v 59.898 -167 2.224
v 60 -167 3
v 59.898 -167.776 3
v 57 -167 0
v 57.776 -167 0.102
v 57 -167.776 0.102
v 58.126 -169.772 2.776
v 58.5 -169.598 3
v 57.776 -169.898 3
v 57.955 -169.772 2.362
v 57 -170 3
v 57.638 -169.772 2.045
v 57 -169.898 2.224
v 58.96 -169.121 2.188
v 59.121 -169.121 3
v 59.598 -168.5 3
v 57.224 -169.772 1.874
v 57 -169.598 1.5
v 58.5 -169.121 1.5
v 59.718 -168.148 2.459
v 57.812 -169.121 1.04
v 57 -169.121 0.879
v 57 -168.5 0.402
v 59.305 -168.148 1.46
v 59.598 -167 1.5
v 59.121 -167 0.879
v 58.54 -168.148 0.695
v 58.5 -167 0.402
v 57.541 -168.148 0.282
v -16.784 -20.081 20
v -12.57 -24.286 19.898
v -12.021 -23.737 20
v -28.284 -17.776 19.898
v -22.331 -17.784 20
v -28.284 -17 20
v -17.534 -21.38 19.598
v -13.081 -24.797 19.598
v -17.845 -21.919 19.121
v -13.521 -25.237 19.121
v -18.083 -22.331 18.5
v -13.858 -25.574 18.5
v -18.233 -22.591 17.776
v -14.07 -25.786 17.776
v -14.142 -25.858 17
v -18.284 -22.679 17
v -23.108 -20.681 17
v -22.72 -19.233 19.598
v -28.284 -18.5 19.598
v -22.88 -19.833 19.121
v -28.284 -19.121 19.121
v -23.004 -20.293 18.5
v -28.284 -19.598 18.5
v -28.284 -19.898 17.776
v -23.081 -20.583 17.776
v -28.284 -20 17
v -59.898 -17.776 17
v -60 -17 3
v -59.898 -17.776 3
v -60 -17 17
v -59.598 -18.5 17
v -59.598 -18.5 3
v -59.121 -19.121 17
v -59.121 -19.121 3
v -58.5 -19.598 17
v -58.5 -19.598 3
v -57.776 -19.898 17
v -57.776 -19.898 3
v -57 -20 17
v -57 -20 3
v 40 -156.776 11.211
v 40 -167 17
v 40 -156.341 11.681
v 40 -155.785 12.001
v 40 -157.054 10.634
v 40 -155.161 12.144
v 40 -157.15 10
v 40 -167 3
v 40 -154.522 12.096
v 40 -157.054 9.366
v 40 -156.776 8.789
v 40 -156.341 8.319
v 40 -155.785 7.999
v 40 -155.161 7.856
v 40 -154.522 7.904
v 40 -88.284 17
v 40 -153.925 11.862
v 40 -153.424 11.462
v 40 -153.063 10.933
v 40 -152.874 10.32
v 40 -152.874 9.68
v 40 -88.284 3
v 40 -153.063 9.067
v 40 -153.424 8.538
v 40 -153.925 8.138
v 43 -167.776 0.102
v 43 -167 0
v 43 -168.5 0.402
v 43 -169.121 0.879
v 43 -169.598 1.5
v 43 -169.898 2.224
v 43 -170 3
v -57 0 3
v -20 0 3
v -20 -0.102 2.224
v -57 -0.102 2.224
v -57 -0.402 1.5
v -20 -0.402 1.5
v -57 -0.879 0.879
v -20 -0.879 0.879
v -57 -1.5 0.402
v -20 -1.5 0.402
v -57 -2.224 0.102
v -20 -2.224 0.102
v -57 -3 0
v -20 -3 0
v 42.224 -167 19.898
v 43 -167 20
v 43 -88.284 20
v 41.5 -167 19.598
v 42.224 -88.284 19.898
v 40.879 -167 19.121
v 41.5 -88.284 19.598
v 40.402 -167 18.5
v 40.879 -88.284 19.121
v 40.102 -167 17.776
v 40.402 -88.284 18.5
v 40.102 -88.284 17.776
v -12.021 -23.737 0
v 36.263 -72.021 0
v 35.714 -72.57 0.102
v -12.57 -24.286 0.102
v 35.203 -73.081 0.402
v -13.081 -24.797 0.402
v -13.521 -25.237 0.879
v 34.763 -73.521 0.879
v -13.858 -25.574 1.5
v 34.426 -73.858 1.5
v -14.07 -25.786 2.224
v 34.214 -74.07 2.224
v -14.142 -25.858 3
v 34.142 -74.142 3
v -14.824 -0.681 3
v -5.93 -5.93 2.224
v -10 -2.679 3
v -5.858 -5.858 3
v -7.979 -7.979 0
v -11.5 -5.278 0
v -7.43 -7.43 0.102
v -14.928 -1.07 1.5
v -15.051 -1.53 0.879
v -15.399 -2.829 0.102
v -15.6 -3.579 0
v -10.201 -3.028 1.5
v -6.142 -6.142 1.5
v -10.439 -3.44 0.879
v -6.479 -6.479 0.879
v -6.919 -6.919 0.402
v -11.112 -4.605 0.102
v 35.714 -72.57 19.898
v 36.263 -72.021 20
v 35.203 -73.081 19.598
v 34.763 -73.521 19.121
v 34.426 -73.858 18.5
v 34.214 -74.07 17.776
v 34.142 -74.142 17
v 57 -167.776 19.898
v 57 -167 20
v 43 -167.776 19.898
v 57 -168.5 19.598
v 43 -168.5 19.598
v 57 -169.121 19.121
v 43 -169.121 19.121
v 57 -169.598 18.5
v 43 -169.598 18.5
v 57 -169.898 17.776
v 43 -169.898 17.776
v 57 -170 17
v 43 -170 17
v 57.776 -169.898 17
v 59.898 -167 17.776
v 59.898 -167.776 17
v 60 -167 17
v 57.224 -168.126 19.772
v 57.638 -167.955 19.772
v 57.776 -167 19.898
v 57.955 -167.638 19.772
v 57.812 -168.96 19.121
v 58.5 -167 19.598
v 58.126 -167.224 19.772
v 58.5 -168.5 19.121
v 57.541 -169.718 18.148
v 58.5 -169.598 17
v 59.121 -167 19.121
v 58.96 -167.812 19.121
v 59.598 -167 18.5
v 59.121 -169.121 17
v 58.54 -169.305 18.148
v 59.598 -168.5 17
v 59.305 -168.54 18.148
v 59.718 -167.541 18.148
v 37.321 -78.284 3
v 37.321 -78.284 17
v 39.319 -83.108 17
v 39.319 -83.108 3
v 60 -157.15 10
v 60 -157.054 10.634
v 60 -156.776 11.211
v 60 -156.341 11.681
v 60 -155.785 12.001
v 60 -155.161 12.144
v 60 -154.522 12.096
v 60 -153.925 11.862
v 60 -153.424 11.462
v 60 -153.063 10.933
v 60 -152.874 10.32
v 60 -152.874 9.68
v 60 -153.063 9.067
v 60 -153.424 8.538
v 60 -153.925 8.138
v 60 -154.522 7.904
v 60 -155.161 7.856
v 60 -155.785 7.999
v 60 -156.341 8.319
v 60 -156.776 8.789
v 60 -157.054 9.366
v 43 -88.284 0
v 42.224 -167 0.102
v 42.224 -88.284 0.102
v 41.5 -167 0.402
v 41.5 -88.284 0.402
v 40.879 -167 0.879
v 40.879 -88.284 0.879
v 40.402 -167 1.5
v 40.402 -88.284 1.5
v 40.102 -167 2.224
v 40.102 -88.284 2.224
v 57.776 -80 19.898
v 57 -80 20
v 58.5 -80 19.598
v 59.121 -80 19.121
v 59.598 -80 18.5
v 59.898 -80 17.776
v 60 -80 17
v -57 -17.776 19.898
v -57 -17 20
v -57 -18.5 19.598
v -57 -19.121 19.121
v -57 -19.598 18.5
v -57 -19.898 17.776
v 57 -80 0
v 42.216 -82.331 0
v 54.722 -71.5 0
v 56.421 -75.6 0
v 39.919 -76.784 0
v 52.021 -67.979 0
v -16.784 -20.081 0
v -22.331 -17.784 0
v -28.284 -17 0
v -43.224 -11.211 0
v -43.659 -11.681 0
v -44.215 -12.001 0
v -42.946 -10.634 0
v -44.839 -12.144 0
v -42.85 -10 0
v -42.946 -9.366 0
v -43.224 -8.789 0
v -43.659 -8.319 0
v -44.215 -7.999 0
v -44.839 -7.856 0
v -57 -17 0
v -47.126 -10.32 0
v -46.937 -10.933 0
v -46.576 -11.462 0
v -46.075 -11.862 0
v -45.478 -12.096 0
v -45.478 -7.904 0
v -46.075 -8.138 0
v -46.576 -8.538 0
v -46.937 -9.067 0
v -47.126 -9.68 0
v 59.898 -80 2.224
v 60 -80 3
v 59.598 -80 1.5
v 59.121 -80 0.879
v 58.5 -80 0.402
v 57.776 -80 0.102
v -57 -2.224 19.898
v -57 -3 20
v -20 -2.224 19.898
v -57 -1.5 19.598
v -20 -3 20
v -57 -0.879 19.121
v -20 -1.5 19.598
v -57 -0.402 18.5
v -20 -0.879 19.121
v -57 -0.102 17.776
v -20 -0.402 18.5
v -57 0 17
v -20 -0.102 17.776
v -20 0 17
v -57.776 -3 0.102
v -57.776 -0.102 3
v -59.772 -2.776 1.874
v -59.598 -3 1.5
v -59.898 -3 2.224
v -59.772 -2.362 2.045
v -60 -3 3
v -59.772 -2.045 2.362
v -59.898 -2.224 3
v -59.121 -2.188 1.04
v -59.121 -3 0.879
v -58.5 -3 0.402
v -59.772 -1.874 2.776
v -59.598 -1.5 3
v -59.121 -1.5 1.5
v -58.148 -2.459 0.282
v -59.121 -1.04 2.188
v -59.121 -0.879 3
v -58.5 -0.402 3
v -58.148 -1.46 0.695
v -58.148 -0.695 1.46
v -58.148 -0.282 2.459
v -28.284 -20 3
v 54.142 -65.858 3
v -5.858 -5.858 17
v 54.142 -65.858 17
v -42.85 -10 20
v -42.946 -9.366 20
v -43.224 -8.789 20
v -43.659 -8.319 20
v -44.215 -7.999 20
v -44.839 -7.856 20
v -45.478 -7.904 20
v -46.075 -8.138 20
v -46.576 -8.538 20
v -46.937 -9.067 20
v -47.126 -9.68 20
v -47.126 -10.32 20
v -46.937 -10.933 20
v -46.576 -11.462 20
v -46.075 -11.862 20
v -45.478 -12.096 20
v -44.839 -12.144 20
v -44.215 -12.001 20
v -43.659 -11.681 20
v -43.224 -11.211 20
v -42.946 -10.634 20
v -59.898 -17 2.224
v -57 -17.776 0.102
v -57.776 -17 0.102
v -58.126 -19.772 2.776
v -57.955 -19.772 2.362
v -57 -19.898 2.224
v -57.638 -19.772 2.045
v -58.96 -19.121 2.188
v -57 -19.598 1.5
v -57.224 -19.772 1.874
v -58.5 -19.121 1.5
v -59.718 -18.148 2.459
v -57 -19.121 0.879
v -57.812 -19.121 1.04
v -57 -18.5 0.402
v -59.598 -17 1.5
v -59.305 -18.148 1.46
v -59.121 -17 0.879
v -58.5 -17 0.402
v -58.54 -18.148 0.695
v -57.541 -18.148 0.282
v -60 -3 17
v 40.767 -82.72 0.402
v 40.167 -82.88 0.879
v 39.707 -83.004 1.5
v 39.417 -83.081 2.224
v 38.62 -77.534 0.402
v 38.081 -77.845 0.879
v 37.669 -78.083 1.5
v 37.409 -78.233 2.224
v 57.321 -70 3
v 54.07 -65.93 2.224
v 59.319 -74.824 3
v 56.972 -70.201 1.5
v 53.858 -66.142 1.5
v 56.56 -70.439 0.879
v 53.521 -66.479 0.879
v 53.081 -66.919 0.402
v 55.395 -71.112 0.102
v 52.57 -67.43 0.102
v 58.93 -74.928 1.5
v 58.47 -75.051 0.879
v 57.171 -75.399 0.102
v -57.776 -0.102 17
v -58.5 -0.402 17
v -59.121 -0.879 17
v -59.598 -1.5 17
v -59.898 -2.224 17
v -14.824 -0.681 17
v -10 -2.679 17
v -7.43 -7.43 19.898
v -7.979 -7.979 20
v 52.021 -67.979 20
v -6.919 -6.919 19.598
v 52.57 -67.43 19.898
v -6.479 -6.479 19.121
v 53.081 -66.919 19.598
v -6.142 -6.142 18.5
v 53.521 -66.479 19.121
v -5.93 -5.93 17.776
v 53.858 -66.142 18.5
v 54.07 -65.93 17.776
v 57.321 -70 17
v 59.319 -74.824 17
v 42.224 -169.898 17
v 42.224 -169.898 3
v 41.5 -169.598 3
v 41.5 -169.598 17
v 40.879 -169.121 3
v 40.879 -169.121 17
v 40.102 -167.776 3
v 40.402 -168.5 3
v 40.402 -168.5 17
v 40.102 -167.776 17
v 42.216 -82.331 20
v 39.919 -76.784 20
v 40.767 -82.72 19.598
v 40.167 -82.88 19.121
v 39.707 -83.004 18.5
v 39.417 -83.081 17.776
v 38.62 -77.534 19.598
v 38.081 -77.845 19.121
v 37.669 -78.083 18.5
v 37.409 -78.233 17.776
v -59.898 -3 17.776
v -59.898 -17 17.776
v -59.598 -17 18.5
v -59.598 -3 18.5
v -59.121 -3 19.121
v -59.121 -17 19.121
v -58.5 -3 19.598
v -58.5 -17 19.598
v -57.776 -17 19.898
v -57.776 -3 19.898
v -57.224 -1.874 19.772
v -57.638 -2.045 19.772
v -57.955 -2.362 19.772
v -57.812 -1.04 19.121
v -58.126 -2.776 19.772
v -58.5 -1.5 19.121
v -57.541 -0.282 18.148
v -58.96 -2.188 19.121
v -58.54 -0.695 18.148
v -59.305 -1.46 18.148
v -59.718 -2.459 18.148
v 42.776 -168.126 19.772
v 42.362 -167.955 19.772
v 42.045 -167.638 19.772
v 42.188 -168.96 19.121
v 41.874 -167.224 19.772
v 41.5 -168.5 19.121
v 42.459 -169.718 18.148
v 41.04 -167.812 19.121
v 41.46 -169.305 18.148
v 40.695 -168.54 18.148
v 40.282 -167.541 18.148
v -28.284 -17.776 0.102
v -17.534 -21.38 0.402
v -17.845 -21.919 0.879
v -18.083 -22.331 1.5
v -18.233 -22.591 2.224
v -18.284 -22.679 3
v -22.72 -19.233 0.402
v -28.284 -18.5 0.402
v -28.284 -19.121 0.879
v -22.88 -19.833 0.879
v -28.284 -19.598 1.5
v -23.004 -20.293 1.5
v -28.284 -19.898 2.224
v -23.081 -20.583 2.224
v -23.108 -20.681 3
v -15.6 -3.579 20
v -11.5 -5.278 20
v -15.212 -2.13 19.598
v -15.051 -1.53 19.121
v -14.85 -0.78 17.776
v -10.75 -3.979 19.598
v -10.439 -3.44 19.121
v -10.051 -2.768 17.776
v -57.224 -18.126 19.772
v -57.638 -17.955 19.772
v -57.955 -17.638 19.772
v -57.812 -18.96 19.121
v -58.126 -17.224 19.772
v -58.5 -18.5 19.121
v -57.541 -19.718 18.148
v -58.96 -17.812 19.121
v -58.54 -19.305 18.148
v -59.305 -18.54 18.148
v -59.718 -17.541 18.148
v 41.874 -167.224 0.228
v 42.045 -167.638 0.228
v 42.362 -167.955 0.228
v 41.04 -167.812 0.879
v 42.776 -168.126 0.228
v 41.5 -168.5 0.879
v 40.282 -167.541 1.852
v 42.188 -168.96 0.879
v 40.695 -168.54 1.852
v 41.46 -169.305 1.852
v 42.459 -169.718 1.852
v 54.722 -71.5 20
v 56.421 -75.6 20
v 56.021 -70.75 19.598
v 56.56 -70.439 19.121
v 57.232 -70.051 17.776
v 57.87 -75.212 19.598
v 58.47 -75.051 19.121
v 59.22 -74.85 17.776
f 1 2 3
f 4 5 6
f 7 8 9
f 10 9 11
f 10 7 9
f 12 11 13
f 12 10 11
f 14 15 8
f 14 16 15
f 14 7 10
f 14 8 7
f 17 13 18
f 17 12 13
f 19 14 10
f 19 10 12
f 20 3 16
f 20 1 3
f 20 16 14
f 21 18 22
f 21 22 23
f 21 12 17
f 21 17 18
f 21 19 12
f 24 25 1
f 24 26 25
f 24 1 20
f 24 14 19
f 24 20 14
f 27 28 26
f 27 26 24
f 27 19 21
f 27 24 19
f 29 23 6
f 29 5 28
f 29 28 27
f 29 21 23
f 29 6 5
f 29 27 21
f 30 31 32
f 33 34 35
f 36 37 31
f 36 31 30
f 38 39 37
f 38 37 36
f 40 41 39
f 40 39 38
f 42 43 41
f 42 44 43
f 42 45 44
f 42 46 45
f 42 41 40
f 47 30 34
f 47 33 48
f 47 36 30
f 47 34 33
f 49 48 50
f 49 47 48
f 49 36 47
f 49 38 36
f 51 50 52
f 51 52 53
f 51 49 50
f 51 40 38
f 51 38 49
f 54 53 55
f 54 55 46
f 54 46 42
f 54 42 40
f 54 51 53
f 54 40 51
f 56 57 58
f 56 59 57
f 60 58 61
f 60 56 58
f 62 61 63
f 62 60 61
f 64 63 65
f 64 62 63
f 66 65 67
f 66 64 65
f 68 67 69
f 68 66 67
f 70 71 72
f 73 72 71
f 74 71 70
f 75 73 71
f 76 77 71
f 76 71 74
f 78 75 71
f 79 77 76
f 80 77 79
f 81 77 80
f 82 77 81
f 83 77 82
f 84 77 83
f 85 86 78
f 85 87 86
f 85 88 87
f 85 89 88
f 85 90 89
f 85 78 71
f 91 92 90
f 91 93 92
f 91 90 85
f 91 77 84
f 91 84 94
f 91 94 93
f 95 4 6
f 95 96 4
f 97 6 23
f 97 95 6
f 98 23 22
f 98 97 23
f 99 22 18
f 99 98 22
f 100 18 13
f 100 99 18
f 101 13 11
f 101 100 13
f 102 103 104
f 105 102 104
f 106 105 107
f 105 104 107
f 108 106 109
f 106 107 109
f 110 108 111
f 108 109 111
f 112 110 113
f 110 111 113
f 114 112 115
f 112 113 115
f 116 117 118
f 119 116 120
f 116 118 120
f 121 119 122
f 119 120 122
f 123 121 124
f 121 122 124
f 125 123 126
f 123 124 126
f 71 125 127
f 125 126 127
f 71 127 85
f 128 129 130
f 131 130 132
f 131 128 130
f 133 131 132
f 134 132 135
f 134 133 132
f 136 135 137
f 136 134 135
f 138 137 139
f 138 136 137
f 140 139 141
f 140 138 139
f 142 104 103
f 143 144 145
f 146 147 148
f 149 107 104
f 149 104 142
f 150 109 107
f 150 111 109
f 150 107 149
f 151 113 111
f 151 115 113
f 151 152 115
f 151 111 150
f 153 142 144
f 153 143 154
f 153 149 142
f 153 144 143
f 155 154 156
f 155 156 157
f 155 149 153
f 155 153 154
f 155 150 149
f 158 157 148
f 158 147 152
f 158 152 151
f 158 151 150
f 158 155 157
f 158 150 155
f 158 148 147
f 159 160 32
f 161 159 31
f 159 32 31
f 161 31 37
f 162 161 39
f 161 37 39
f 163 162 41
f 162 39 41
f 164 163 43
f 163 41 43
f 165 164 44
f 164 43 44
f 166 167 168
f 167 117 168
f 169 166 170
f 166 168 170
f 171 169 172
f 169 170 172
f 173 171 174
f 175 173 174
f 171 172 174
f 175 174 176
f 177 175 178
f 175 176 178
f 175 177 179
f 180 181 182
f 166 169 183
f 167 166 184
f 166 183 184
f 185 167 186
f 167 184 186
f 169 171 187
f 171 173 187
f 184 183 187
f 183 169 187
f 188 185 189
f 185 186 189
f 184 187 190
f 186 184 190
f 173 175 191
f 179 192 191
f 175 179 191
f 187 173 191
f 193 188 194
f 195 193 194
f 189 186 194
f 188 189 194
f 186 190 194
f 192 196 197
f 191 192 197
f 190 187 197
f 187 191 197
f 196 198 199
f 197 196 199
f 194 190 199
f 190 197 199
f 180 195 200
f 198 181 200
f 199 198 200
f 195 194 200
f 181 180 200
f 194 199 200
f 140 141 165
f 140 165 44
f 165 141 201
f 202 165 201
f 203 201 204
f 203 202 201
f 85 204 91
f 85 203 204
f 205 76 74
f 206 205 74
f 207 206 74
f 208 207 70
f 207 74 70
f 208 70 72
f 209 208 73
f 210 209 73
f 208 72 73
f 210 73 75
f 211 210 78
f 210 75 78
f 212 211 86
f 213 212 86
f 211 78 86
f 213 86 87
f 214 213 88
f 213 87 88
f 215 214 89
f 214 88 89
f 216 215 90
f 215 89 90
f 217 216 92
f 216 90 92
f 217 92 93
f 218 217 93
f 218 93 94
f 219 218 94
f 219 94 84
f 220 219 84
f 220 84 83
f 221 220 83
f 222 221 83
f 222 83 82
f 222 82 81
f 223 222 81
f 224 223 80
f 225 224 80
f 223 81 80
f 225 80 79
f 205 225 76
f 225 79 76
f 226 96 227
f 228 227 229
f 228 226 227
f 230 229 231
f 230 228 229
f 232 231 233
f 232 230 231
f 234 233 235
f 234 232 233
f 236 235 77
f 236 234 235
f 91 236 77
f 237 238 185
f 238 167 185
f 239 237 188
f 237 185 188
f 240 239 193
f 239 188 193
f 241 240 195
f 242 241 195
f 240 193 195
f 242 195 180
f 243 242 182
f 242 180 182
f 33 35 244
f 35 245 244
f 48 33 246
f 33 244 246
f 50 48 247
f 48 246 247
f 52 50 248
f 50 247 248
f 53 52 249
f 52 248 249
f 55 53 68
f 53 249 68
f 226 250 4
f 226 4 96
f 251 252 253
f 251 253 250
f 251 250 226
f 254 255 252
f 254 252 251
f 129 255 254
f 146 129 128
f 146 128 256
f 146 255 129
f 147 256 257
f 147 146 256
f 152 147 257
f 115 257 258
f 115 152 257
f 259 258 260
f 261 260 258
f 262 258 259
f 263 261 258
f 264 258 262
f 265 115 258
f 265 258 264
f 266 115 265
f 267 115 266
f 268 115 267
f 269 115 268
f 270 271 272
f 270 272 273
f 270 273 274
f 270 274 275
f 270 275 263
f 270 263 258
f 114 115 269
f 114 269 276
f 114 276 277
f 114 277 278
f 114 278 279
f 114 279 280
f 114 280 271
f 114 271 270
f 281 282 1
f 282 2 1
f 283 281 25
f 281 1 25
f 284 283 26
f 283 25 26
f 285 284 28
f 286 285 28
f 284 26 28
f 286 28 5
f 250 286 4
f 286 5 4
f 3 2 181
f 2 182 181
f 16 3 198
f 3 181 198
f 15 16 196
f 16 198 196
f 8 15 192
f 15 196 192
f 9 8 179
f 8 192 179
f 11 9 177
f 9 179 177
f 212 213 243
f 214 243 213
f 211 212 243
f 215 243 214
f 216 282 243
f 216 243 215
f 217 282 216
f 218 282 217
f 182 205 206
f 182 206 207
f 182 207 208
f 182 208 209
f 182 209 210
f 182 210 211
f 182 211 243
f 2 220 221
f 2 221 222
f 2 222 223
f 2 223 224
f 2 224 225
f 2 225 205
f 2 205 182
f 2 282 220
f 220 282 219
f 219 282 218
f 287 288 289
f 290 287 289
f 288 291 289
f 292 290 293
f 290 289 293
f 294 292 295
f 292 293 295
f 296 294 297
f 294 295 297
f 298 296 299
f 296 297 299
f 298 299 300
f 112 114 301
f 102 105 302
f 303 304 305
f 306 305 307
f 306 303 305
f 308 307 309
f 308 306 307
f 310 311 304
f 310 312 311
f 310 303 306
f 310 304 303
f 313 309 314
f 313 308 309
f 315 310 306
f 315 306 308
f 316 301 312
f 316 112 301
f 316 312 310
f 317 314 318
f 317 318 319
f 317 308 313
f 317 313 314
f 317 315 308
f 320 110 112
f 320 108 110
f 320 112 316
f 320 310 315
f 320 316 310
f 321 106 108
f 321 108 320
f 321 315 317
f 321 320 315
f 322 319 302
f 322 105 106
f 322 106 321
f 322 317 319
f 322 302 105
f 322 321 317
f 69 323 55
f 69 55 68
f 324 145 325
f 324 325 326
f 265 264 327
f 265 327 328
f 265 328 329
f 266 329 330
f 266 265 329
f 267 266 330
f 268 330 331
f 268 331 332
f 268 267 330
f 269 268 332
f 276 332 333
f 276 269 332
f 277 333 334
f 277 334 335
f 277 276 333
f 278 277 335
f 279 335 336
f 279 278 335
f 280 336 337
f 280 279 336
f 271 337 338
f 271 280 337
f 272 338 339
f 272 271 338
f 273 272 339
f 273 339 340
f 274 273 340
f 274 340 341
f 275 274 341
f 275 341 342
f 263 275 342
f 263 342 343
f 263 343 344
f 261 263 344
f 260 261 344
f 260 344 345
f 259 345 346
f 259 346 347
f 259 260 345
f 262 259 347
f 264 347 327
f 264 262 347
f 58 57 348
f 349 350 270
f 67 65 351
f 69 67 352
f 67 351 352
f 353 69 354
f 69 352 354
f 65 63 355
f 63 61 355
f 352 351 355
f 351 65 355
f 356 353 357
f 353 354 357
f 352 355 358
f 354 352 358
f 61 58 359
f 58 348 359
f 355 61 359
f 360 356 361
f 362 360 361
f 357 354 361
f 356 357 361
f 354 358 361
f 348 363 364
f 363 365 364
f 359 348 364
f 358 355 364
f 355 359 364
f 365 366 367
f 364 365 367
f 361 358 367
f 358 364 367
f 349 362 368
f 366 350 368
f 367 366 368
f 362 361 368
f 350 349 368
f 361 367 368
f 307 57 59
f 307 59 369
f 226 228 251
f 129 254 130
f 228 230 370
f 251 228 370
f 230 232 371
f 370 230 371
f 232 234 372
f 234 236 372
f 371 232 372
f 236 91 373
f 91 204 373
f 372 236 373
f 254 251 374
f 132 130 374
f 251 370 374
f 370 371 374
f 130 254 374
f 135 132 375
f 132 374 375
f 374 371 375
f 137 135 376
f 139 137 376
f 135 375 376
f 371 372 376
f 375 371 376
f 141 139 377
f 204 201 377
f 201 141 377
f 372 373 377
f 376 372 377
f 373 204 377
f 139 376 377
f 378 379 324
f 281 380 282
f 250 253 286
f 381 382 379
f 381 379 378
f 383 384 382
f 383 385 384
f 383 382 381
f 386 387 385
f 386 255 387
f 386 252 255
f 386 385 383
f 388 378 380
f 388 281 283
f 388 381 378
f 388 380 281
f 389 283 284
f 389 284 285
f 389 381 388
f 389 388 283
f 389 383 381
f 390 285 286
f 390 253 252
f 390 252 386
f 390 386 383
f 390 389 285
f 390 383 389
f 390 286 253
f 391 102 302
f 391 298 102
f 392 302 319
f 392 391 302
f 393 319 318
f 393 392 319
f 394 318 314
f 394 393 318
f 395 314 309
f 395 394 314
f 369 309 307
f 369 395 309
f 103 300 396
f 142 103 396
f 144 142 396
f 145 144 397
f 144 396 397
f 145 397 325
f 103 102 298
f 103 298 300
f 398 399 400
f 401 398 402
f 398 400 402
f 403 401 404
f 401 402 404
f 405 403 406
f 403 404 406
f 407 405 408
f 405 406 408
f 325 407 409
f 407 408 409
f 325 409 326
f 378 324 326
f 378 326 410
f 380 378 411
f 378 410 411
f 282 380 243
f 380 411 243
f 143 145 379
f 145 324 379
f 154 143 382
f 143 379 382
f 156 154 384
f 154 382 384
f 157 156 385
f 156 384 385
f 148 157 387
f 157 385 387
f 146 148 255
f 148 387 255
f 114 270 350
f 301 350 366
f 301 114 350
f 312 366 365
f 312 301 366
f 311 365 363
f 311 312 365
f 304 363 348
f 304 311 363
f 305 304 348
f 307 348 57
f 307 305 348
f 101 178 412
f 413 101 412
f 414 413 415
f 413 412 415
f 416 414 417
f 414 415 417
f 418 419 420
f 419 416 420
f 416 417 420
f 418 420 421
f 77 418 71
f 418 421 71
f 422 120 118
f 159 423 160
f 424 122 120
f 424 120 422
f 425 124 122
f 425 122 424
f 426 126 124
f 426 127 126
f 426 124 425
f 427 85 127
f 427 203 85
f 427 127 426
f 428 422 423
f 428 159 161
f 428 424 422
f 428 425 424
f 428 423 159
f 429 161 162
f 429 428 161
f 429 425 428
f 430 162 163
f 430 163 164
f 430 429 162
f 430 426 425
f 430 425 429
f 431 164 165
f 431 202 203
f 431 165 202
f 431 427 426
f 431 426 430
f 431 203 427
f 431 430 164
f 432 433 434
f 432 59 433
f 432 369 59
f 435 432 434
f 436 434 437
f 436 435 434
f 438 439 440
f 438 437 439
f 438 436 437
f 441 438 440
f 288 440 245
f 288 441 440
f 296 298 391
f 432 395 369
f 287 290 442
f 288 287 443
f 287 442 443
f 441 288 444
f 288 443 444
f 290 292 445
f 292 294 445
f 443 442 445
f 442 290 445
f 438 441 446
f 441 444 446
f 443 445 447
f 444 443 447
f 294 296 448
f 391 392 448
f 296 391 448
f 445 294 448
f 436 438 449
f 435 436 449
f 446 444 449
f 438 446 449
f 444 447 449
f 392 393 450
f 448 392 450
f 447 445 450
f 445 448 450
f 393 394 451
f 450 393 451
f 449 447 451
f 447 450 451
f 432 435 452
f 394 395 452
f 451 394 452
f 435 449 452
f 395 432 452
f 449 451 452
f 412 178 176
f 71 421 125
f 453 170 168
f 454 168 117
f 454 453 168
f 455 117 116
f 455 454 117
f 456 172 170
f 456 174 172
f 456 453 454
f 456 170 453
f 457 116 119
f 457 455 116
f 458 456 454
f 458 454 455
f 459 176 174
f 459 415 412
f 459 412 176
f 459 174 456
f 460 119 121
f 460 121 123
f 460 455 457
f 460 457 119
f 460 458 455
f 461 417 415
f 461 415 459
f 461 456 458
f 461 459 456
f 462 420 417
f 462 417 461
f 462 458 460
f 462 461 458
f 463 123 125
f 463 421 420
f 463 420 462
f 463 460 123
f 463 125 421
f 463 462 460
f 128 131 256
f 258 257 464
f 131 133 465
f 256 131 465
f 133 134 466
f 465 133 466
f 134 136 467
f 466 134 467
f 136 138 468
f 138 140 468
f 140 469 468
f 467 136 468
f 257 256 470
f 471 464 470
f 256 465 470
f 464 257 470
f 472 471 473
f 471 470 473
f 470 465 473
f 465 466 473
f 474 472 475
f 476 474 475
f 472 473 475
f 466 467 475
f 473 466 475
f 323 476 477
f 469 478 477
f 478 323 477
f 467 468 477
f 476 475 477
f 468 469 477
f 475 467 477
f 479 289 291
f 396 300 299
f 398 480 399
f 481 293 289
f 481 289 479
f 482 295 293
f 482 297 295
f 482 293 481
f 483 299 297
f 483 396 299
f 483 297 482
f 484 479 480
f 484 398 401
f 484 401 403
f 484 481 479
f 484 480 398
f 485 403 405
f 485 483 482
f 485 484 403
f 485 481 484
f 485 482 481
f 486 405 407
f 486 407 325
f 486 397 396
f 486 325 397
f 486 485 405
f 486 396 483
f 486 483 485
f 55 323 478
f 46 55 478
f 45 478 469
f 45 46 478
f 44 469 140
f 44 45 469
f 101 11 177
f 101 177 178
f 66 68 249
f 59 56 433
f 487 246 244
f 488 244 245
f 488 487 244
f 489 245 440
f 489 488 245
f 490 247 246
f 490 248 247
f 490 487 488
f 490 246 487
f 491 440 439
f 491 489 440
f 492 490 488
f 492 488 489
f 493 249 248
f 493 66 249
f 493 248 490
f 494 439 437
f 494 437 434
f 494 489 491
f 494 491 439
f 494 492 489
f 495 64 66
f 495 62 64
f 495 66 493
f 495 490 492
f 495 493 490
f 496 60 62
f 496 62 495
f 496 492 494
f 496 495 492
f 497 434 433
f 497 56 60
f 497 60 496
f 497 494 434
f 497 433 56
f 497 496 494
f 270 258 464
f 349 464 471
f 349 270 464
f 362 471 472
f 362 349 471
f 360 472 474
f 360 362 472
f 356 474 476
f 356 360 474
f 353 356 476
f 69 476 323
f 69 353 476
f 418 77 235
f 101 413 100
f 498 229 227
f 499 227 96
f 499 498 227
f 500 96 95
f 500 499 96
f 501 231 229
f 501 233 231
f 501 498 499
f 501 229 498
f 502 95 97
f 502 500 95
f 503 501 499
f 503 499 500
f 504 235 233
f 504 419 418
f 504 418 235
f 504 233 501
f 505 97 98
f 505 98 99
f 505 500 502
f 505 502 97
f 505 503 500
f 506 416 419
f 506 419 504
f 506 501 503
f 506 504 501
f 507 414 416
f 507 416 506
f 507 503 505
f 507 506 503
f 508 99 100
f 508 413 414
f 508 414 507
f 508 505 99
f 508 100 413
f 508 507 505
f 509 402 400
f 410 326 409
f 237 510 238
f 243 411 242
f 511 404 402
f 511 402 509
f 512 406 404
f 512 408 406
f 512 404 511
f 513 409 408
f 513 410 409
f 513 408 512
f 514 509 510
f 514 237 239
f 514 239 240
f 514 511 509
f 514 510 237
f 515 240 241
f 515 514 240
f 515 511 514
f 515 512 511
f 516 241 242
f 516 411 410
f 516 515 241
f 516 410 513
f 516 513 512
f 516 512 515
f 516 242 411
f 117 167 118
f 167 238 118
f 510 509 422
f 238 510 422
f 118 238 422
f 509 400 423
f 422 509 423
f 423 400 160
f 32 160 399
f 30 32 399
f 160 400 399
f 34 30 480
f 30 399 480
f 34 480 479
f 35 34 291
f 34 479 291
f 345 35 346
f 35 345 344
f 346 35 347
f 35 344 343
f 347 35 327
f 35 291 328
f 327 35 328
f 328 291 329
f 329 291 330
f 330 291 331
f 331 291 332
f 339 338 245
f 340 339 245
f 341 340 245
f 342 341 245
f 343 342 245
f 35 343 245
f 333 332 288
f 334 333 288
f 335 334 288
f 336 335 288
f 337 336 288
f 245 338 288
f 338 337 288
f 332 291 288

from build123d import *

# Parameters (mm, degrees)
CROQUIS1_R              = 2.15
SALIENTE_EXTRUIR1_DEPTH = 20
REDONDEO1_R             = 20
CROQUIS4_R              = 2.15
CORTAR_EXTRUIR3_DEPTH   = 20
REDONDEO2_R             = 3


with BuildPart() as part:
    # Croquis1 → Saliente-Extruir1 (new body)
    with BuildSketch(Plane.XY):
        Polygon((-60, 0), (-11.715728753, 0), (60, -71.715728753), (60, -170), (40, -170), (40, -80), (-20, -20), (-60, -20), align=None)
        with Locations((-45, -10)):
            Circle(CROQUIS1_R, mode=Mode.SUBTRACT)
    extrude(amount=SALIENTE_EXTRUIR1_DEPTH)

    # Redondeo1
    redondeo1_edges = [part.edges().sort_by_distance(p)[0] for p in [
        (-20, -20, 10),
        (40, -80, 10),
        (60, -71.715728753, 10),
        (-11.715728753, 0, 10),
    ]]
    fillet(redondeo1_edges, radius=REDONDEO1_R)

    # Croquis4 → Cortar-Extruir3 (cut)
    with BuildSketch(Plane.ZY.offset(-40)):
        with Locations(Location((10, -155, 0), (0, 0, 270))):
            Circle(CROQUIS4_R)
    extrude(amount=-CORTAR_EXTRUIR3_DEPTH, mode=Mode.SUBTRACT)

    # Redondeo2
    redondeo2_edges = [part.edges().sort_by_distance(p)[0] for p in [
        (-40, 0, 0),
        (-60, -10, 0),
        (-60, -20, 10),
        (40, -170, 10),
        (60, -170, 10),
        (-60, 0, 10),
        (50, -170, 20),
        (40, -129.142135624, 20),
        (10, -50, 0),
        (10, -50, 20),
        (24.142135624, -35.857864376, 0),
        (24.142135624, -35.857864376, 20),
        (60, -125, 0),
        (-44.142135624, -20, 0),
        (-12.346331353, -1.52240935, 0),
        (58.47759065, -72.346331353, 0),
        (60, -125, 20),
        (-44.142135624, -20, 20),
        (-12.346331353, -1.52240935, 20),
        (58.47759065, -72.346331353, 20),
        (38.47759065, -80.6306026, 0),
        (38.47759065, -80.6306026, 20),
        (-20.6306026, -21.52240935, 0),
        (-20.6306026, -21.52240935, 20),
        (-60, -10, 20),
        (-40, 0, 20),
        (40, -129.142135624, 0),
        (50, -170, 0),
    ]]
    fillet(redondeo2_edges, radius=REDONDEO2_R)


solid = part.part
